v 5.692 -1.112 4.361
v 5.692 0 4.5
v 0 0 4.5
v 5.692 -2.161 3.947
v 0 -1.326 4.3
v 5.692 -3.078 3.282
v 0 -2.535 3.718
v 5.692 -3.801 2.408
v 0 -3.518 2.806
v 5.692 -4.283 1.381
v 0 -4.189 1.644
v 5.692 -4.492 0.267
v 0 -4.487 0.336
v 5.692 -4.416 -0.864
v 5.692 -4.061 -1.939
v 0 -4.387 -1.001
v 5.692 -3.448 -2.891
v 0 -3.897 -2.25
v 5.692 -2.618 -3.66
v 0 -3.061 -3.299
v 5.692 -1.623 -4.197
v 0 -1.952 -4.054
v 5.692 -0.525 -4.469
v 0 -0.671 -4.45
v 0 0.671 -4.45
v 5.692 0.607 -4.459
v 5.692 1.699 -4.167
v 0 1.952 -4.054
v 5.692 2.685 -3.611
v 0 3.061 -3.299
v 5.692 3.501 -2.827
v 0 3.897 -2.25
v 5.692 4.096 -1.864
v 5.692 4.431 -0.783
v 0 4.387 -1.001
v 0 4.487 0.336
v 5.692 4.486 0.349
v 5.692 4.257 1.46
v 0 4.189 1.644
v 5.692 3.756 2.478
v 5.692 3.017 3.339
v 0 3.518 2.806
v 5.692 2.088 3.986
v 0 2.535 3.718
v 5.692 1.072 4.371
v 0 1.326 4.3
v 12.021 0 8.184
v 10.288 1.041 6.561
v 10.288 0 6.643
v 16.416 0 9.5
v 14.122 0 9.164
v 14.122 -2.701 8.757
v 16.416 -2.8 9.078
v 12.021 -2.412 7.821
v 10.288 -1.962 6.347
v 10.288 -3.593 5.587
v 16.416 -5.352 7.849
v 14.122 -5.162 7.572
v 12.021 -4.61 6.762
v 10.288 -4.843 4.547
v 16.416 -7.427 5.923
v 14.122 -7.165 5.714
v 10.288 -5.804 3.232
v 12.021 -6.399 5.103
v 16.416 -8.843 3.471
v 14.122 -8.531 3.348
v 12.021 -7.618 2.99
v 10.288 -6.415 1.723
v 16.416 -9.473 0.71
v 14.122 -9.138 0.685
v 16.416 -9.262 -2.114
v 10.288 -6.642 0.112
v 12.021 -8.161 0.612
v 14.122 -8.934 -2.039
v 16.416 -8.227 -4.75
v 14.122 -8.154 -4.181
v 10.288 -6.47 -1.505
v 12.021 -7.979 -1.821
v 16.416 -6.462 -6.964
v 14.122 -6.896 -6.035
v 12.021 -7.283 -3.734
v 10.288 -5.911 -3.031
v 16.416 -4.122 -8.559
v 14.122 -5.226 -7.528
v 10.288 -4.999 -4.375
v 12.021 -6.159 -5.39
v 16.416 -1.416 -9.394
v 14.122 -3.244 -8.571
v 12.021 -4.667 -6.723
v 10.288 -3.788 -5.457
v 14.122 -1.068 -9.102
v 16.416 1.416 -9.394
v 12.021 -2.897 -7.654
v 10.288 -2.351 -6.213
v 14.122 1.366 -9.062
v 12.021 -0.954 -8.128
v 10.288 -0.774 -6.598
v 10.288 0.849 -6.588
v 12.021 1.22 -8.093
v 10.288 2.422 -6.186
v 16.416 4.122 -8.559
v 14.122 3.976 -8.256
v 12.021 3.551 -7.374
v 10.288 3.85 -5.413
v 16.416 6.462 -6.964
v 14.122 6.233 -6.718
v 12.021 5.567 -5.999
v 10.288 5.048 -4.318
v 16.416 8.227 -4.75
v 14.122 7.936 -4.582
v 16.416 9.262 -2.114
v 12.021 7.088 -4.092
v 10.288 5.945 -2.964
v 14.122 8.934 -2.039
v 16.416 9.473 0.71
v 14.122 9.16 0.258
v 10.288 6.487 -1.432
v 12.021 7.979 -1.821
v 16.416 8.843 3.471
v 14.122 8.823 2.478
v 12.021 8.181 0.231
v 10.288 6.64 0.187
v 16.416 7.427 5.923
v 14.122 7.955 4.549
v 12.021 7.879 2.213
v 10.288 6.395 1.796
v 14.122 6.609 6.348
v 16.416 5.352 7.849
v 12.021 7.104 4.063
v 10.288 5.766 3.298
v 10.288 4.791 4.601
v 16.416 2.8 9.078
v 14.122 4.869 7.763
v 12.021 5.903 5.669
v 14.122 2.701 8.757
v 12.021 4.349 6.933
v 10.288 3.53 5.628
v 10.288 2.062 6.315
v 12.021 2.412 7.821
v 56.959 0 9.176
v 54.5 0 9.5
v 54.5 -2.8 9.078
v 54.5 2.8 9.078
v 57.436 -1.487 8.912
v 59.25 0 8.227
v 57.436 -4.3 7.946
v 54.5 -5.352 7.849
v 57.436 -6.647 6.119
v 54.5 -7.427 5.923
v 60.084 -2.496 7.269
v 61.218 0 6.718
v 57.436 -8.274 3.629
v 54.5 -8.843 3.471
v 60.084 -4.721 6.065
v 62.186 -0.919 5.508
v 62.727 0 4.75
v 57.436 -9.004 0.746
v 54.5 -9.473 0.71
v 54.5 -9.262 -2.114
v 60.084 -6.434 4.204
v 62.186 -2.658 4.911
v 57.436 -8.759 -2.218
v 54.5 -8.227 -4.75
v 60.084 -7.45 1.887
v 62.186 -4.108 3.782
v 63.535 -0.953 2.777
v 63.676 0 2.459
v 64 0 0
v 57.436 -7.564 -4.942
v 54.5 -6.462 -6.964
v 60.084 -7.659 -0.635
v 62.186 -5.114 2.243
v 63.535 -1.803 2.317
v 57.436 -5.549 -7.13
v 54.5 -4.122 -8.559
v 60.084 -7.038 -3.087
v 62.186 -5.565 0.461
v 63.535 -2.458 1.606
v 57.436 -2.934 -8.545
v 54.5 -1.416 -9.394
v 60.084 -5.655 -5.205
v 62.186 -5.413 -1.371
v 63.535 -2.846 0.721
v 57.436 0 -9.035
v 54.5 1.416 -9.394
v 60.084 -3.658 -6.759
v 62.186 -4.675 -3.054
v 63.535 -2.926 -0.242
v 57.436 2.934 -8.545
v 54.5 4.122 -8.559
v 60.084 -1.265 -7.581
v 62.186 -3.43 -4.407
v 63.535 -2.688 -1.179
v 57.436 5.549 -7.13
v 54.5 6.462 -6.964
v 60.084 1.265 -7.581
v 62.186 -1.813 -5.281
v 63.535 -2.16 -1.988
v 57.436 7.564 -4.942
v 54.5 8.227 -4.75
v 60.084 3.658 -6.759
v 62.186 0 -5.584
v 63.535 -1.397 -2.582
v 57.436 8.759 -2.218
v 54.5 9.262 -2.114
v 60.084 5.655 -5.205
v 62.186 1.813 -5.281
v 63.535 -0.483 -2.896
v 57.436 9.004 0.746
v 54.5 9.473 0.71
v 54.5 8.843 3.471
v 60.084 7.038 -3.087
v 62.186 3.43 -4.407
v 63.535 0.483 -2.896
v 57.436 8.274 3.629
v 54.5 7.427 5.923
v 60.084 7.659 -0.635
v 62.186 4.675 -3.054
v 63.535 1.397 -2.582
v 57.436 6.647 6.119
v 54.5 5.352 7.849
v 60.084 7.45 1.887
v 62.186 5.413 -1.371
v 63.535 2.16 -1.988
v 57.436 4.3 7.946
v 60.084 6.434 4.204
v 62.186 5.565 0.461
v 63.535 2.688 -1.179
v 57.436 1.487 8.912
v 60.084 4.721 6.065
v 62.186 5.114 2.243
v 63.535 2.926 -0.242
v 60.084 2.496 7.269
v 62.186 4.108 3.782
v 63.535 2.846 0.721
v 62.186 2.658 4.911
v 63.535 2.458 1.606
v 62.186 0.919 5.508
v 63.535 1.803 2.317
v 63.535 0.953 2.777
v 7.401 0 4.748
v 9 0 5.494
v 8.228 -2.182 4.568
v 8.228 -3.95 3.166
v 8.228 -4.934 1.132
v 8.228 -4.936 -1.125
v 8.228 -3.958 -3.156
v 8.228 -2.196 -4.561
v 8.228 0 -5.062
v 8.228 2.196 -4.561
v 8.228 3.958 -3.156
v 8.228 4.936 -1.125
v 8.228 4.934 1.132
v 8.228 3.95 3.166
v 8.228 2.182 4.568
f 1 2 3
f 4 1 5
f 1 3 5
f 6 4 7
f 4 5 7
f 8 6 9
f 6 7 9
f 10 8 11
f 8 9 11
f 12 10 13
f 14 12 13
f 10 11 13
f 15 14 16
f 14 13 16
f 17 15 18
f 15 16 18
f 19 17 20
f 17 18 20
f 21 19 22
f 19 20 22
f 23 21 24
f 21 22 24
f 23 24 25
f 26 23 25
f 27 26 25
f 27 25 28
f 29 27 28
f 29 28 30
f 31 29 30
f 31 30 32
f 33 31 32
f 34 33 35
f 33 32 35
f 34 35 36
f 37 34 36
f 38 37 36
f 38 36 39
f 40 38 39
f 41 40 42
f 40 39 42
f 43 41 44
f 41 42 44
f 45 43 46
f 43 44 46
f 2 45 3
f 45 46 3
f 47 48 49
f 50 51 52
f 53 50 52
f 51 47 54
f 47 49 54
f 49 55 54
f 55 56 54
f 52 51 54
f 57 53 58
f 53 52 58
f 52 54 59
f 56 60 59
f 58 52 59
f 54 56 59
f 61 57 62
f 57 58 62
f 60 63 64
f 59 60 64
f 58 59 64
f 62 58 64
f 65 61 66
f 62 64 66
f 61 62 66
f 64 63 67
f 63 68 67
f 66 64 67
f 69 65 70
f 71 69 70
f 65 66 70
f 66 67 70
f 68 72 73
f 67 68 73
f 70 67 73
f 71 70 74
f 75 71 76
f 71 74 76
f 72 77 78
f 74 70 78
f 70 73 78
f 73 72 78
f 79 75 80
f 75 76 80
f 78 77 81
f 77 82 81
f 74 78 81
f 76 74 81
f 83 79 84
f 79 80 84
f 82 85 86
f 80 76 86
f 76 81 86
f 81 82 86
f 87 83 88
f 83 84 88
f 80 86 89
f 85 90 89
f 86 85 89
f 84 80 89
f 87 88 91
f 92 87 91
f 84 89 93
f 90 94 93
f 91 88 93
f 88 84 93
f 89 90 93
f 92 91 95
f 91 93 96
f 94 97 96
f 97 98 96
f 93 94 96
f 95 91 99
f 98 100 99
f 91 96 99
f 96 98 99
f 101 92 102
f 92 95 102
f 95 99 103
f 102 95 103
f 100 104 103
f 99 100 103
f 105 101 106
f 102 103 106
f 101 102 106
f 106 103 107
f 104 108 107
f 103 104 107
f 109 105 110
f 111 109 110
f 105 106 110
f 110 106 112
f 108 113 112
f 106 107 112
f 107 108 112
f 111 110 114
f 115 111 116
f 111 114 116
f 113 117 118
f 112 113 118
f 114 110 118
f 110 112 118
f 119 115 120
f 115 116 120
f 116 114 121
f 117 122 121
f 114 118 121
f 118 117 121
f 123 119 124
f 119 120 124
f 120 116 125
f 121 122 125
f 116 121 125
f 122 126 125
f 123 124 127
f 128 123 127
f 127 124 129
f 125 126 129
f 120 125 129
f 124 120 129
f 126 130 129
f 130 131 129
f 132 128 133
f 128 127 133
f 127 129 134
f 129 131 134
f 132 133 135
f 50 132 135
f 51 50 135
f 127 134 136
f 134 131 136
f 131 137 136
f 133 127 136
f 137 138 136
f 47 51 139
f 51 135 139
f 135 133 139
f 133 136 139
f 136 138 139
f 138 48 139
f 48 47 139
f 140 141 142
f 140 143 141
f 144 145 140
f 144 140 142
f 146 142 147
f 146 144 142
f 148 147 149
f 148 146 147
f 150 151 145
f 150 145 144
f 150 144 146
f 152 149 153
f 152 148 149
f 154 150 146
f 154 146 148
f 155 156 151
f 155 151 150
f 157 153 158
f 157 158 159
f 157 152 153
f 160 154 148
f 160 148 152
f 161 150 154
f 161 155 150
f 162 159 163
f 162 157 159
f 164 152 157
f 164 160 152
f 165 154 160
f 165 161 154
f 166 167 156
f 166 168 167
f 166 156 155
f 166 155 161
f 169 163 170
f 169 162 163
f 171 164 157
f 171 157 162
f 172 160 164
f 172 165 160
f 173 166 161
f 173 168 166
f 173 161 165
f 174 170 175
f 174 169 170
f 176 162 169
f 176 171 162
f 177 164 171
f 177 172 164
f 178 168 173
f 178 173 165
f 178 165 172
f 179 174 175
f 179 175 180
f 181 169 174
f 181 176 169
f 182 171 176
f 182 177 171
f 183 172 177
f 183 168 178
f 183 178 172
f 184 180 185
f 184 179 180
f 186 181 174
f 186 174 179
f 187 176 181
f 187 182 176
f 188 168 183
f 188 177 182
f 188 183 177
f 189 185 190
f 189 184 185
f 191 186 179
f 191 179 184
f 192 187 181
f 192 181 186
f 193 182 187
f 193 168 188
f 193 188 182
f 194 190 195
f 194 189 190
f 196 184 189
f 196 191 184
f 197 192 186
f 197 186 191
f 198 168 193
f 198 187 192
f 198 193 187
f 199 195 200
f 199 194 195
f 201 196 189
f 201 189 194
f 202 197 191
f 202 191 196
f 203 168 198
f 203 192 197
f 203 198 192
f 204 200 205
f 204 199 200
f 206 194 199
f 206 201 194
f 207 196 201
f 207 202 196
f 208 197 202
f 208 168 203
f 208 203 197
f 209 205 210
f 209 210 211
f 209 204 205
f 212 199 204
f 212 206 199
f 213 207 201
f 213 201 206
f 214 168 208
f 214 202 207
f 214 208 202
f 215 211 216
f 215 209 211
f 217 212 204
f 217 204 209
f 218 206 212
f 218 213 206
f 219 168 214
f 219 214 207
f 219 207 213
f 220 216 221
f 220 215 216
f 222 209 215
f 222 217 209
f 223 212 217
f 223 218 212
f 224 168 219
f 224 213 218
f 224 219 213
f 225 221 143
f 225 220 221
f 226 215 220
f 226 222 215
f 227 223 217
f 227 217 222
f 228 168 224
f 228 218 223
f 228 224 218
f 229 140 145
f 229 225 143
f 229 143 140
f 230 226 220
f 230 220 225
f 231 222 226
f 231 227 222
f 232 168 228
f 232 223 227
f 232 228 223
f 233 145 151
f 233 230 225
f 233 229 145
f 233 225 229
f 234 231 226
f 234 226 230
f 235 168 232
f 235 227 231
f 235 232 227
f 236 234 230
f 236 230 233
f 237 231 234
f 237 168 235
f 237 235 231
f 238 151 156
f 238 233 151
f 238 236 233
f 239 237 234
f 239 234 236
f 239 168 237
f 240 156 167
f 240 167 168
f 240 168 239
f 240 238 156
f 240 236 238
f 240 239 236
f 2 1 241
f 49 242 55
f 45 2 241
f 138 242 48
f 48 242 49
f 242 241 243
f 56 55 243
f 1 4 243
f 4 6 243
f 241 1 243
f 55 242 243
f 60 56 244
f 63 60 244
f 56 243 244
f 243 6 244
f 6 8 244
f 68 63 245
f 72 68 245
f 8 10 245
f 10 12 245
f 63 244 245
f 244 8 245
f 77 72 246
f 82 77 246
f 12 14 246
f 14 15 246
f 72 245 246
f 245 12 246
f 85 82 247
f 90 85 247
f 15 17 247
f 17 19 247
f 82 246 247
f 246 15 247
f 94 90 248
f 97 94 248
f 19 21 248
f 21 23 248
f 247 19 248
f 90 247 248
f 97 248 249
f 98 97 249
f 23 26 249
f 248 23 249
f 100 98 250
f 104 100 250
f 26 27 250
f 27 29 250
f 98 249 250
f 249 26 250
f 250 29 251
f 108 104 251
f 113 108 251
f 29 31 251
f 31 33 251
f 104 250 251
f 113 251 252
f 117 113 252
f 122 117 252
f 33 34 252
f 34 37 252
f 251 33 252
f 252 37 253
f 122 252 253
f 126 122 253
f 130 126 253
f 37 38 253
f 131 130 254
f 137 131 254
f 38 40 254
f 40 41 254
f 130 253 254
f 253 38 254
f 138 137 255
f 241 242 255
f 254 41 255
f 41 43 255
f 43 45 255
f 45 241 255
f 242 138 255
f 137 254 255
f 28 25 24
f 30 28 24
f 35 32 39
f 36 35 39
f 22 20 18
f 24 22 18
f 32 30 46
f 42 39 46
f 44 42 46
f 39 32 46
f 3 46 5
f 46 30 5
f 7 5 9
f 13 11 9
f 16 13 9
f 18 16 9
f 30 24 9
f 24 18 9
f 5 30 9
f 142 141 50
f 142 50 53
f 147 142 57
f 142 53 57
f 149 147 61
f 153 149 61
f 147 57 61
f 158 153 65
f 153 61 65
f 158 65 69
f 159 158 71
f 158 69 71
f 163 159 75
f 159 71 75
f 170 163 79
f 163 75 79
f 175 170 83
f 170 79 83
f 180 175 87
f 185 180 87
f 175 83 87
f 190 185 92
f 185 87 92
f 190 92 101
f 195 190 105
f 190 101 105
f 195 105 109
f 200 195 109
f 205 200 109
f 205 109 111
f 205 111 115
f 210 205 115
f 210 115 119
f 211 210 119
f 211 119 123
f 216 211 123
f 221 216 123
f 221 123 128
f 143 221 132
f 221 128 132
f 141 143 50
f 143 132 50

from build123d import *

# Parameters (mm, degrees)
F3_R = 6
F4_R = 9.5


# Not quite as in the source:
# - a fillet or chamfer that OpenCascade refuses, or shapes differently, is made with other operations: its cross-section is extruded or revolved along the edge and cut away or added


with BuildPart() as f1:
    # F0 (on Front) → F1 (revolve)
    with BuildSketch(Plane.XZ):
        Polygon((0, 4.5), (0, 0), (64, 0), (64, 9.5), (9, 9.5), (9, 4.5), align=None)
    revolve(axis=Axis((32, 0, 0), (1, 0, 0)))

    # F2: fillet of radius 8 on 1 edges, made by hand

    # F2_s1 → F2_t2 (revolve, cut)
    with BuildSketch(Plane.XZ):
        with BuildLine():
            ThreePointArc((16.4161984871, 9.5), (11.9440625321, 8.1332495807), (9, 4.5))
            Line((9, 4.5), (9, 9.5))
            Line((9, 9.5), (16.4161984871, 9.5))
        make_face()
    revolve(axis=Axis((9, 0, 0), (1, 0, 0)), mode=Mode.SUBTRACT)

    # F3
    f3_edges = [f1.edges().sort_by_distance(p)[0] for p in [
        (9, 0, -4.5),
    ]]
    fillet(f3_edges, radius=F3_R)

    # F4
    f4_edges = [f1.edges().sort_by_distance(p)[0] for p in [
        (64, 0, -9.5),
    ]]
    fillet(f4_edges, radius=F4_R)


solid = f1.part
